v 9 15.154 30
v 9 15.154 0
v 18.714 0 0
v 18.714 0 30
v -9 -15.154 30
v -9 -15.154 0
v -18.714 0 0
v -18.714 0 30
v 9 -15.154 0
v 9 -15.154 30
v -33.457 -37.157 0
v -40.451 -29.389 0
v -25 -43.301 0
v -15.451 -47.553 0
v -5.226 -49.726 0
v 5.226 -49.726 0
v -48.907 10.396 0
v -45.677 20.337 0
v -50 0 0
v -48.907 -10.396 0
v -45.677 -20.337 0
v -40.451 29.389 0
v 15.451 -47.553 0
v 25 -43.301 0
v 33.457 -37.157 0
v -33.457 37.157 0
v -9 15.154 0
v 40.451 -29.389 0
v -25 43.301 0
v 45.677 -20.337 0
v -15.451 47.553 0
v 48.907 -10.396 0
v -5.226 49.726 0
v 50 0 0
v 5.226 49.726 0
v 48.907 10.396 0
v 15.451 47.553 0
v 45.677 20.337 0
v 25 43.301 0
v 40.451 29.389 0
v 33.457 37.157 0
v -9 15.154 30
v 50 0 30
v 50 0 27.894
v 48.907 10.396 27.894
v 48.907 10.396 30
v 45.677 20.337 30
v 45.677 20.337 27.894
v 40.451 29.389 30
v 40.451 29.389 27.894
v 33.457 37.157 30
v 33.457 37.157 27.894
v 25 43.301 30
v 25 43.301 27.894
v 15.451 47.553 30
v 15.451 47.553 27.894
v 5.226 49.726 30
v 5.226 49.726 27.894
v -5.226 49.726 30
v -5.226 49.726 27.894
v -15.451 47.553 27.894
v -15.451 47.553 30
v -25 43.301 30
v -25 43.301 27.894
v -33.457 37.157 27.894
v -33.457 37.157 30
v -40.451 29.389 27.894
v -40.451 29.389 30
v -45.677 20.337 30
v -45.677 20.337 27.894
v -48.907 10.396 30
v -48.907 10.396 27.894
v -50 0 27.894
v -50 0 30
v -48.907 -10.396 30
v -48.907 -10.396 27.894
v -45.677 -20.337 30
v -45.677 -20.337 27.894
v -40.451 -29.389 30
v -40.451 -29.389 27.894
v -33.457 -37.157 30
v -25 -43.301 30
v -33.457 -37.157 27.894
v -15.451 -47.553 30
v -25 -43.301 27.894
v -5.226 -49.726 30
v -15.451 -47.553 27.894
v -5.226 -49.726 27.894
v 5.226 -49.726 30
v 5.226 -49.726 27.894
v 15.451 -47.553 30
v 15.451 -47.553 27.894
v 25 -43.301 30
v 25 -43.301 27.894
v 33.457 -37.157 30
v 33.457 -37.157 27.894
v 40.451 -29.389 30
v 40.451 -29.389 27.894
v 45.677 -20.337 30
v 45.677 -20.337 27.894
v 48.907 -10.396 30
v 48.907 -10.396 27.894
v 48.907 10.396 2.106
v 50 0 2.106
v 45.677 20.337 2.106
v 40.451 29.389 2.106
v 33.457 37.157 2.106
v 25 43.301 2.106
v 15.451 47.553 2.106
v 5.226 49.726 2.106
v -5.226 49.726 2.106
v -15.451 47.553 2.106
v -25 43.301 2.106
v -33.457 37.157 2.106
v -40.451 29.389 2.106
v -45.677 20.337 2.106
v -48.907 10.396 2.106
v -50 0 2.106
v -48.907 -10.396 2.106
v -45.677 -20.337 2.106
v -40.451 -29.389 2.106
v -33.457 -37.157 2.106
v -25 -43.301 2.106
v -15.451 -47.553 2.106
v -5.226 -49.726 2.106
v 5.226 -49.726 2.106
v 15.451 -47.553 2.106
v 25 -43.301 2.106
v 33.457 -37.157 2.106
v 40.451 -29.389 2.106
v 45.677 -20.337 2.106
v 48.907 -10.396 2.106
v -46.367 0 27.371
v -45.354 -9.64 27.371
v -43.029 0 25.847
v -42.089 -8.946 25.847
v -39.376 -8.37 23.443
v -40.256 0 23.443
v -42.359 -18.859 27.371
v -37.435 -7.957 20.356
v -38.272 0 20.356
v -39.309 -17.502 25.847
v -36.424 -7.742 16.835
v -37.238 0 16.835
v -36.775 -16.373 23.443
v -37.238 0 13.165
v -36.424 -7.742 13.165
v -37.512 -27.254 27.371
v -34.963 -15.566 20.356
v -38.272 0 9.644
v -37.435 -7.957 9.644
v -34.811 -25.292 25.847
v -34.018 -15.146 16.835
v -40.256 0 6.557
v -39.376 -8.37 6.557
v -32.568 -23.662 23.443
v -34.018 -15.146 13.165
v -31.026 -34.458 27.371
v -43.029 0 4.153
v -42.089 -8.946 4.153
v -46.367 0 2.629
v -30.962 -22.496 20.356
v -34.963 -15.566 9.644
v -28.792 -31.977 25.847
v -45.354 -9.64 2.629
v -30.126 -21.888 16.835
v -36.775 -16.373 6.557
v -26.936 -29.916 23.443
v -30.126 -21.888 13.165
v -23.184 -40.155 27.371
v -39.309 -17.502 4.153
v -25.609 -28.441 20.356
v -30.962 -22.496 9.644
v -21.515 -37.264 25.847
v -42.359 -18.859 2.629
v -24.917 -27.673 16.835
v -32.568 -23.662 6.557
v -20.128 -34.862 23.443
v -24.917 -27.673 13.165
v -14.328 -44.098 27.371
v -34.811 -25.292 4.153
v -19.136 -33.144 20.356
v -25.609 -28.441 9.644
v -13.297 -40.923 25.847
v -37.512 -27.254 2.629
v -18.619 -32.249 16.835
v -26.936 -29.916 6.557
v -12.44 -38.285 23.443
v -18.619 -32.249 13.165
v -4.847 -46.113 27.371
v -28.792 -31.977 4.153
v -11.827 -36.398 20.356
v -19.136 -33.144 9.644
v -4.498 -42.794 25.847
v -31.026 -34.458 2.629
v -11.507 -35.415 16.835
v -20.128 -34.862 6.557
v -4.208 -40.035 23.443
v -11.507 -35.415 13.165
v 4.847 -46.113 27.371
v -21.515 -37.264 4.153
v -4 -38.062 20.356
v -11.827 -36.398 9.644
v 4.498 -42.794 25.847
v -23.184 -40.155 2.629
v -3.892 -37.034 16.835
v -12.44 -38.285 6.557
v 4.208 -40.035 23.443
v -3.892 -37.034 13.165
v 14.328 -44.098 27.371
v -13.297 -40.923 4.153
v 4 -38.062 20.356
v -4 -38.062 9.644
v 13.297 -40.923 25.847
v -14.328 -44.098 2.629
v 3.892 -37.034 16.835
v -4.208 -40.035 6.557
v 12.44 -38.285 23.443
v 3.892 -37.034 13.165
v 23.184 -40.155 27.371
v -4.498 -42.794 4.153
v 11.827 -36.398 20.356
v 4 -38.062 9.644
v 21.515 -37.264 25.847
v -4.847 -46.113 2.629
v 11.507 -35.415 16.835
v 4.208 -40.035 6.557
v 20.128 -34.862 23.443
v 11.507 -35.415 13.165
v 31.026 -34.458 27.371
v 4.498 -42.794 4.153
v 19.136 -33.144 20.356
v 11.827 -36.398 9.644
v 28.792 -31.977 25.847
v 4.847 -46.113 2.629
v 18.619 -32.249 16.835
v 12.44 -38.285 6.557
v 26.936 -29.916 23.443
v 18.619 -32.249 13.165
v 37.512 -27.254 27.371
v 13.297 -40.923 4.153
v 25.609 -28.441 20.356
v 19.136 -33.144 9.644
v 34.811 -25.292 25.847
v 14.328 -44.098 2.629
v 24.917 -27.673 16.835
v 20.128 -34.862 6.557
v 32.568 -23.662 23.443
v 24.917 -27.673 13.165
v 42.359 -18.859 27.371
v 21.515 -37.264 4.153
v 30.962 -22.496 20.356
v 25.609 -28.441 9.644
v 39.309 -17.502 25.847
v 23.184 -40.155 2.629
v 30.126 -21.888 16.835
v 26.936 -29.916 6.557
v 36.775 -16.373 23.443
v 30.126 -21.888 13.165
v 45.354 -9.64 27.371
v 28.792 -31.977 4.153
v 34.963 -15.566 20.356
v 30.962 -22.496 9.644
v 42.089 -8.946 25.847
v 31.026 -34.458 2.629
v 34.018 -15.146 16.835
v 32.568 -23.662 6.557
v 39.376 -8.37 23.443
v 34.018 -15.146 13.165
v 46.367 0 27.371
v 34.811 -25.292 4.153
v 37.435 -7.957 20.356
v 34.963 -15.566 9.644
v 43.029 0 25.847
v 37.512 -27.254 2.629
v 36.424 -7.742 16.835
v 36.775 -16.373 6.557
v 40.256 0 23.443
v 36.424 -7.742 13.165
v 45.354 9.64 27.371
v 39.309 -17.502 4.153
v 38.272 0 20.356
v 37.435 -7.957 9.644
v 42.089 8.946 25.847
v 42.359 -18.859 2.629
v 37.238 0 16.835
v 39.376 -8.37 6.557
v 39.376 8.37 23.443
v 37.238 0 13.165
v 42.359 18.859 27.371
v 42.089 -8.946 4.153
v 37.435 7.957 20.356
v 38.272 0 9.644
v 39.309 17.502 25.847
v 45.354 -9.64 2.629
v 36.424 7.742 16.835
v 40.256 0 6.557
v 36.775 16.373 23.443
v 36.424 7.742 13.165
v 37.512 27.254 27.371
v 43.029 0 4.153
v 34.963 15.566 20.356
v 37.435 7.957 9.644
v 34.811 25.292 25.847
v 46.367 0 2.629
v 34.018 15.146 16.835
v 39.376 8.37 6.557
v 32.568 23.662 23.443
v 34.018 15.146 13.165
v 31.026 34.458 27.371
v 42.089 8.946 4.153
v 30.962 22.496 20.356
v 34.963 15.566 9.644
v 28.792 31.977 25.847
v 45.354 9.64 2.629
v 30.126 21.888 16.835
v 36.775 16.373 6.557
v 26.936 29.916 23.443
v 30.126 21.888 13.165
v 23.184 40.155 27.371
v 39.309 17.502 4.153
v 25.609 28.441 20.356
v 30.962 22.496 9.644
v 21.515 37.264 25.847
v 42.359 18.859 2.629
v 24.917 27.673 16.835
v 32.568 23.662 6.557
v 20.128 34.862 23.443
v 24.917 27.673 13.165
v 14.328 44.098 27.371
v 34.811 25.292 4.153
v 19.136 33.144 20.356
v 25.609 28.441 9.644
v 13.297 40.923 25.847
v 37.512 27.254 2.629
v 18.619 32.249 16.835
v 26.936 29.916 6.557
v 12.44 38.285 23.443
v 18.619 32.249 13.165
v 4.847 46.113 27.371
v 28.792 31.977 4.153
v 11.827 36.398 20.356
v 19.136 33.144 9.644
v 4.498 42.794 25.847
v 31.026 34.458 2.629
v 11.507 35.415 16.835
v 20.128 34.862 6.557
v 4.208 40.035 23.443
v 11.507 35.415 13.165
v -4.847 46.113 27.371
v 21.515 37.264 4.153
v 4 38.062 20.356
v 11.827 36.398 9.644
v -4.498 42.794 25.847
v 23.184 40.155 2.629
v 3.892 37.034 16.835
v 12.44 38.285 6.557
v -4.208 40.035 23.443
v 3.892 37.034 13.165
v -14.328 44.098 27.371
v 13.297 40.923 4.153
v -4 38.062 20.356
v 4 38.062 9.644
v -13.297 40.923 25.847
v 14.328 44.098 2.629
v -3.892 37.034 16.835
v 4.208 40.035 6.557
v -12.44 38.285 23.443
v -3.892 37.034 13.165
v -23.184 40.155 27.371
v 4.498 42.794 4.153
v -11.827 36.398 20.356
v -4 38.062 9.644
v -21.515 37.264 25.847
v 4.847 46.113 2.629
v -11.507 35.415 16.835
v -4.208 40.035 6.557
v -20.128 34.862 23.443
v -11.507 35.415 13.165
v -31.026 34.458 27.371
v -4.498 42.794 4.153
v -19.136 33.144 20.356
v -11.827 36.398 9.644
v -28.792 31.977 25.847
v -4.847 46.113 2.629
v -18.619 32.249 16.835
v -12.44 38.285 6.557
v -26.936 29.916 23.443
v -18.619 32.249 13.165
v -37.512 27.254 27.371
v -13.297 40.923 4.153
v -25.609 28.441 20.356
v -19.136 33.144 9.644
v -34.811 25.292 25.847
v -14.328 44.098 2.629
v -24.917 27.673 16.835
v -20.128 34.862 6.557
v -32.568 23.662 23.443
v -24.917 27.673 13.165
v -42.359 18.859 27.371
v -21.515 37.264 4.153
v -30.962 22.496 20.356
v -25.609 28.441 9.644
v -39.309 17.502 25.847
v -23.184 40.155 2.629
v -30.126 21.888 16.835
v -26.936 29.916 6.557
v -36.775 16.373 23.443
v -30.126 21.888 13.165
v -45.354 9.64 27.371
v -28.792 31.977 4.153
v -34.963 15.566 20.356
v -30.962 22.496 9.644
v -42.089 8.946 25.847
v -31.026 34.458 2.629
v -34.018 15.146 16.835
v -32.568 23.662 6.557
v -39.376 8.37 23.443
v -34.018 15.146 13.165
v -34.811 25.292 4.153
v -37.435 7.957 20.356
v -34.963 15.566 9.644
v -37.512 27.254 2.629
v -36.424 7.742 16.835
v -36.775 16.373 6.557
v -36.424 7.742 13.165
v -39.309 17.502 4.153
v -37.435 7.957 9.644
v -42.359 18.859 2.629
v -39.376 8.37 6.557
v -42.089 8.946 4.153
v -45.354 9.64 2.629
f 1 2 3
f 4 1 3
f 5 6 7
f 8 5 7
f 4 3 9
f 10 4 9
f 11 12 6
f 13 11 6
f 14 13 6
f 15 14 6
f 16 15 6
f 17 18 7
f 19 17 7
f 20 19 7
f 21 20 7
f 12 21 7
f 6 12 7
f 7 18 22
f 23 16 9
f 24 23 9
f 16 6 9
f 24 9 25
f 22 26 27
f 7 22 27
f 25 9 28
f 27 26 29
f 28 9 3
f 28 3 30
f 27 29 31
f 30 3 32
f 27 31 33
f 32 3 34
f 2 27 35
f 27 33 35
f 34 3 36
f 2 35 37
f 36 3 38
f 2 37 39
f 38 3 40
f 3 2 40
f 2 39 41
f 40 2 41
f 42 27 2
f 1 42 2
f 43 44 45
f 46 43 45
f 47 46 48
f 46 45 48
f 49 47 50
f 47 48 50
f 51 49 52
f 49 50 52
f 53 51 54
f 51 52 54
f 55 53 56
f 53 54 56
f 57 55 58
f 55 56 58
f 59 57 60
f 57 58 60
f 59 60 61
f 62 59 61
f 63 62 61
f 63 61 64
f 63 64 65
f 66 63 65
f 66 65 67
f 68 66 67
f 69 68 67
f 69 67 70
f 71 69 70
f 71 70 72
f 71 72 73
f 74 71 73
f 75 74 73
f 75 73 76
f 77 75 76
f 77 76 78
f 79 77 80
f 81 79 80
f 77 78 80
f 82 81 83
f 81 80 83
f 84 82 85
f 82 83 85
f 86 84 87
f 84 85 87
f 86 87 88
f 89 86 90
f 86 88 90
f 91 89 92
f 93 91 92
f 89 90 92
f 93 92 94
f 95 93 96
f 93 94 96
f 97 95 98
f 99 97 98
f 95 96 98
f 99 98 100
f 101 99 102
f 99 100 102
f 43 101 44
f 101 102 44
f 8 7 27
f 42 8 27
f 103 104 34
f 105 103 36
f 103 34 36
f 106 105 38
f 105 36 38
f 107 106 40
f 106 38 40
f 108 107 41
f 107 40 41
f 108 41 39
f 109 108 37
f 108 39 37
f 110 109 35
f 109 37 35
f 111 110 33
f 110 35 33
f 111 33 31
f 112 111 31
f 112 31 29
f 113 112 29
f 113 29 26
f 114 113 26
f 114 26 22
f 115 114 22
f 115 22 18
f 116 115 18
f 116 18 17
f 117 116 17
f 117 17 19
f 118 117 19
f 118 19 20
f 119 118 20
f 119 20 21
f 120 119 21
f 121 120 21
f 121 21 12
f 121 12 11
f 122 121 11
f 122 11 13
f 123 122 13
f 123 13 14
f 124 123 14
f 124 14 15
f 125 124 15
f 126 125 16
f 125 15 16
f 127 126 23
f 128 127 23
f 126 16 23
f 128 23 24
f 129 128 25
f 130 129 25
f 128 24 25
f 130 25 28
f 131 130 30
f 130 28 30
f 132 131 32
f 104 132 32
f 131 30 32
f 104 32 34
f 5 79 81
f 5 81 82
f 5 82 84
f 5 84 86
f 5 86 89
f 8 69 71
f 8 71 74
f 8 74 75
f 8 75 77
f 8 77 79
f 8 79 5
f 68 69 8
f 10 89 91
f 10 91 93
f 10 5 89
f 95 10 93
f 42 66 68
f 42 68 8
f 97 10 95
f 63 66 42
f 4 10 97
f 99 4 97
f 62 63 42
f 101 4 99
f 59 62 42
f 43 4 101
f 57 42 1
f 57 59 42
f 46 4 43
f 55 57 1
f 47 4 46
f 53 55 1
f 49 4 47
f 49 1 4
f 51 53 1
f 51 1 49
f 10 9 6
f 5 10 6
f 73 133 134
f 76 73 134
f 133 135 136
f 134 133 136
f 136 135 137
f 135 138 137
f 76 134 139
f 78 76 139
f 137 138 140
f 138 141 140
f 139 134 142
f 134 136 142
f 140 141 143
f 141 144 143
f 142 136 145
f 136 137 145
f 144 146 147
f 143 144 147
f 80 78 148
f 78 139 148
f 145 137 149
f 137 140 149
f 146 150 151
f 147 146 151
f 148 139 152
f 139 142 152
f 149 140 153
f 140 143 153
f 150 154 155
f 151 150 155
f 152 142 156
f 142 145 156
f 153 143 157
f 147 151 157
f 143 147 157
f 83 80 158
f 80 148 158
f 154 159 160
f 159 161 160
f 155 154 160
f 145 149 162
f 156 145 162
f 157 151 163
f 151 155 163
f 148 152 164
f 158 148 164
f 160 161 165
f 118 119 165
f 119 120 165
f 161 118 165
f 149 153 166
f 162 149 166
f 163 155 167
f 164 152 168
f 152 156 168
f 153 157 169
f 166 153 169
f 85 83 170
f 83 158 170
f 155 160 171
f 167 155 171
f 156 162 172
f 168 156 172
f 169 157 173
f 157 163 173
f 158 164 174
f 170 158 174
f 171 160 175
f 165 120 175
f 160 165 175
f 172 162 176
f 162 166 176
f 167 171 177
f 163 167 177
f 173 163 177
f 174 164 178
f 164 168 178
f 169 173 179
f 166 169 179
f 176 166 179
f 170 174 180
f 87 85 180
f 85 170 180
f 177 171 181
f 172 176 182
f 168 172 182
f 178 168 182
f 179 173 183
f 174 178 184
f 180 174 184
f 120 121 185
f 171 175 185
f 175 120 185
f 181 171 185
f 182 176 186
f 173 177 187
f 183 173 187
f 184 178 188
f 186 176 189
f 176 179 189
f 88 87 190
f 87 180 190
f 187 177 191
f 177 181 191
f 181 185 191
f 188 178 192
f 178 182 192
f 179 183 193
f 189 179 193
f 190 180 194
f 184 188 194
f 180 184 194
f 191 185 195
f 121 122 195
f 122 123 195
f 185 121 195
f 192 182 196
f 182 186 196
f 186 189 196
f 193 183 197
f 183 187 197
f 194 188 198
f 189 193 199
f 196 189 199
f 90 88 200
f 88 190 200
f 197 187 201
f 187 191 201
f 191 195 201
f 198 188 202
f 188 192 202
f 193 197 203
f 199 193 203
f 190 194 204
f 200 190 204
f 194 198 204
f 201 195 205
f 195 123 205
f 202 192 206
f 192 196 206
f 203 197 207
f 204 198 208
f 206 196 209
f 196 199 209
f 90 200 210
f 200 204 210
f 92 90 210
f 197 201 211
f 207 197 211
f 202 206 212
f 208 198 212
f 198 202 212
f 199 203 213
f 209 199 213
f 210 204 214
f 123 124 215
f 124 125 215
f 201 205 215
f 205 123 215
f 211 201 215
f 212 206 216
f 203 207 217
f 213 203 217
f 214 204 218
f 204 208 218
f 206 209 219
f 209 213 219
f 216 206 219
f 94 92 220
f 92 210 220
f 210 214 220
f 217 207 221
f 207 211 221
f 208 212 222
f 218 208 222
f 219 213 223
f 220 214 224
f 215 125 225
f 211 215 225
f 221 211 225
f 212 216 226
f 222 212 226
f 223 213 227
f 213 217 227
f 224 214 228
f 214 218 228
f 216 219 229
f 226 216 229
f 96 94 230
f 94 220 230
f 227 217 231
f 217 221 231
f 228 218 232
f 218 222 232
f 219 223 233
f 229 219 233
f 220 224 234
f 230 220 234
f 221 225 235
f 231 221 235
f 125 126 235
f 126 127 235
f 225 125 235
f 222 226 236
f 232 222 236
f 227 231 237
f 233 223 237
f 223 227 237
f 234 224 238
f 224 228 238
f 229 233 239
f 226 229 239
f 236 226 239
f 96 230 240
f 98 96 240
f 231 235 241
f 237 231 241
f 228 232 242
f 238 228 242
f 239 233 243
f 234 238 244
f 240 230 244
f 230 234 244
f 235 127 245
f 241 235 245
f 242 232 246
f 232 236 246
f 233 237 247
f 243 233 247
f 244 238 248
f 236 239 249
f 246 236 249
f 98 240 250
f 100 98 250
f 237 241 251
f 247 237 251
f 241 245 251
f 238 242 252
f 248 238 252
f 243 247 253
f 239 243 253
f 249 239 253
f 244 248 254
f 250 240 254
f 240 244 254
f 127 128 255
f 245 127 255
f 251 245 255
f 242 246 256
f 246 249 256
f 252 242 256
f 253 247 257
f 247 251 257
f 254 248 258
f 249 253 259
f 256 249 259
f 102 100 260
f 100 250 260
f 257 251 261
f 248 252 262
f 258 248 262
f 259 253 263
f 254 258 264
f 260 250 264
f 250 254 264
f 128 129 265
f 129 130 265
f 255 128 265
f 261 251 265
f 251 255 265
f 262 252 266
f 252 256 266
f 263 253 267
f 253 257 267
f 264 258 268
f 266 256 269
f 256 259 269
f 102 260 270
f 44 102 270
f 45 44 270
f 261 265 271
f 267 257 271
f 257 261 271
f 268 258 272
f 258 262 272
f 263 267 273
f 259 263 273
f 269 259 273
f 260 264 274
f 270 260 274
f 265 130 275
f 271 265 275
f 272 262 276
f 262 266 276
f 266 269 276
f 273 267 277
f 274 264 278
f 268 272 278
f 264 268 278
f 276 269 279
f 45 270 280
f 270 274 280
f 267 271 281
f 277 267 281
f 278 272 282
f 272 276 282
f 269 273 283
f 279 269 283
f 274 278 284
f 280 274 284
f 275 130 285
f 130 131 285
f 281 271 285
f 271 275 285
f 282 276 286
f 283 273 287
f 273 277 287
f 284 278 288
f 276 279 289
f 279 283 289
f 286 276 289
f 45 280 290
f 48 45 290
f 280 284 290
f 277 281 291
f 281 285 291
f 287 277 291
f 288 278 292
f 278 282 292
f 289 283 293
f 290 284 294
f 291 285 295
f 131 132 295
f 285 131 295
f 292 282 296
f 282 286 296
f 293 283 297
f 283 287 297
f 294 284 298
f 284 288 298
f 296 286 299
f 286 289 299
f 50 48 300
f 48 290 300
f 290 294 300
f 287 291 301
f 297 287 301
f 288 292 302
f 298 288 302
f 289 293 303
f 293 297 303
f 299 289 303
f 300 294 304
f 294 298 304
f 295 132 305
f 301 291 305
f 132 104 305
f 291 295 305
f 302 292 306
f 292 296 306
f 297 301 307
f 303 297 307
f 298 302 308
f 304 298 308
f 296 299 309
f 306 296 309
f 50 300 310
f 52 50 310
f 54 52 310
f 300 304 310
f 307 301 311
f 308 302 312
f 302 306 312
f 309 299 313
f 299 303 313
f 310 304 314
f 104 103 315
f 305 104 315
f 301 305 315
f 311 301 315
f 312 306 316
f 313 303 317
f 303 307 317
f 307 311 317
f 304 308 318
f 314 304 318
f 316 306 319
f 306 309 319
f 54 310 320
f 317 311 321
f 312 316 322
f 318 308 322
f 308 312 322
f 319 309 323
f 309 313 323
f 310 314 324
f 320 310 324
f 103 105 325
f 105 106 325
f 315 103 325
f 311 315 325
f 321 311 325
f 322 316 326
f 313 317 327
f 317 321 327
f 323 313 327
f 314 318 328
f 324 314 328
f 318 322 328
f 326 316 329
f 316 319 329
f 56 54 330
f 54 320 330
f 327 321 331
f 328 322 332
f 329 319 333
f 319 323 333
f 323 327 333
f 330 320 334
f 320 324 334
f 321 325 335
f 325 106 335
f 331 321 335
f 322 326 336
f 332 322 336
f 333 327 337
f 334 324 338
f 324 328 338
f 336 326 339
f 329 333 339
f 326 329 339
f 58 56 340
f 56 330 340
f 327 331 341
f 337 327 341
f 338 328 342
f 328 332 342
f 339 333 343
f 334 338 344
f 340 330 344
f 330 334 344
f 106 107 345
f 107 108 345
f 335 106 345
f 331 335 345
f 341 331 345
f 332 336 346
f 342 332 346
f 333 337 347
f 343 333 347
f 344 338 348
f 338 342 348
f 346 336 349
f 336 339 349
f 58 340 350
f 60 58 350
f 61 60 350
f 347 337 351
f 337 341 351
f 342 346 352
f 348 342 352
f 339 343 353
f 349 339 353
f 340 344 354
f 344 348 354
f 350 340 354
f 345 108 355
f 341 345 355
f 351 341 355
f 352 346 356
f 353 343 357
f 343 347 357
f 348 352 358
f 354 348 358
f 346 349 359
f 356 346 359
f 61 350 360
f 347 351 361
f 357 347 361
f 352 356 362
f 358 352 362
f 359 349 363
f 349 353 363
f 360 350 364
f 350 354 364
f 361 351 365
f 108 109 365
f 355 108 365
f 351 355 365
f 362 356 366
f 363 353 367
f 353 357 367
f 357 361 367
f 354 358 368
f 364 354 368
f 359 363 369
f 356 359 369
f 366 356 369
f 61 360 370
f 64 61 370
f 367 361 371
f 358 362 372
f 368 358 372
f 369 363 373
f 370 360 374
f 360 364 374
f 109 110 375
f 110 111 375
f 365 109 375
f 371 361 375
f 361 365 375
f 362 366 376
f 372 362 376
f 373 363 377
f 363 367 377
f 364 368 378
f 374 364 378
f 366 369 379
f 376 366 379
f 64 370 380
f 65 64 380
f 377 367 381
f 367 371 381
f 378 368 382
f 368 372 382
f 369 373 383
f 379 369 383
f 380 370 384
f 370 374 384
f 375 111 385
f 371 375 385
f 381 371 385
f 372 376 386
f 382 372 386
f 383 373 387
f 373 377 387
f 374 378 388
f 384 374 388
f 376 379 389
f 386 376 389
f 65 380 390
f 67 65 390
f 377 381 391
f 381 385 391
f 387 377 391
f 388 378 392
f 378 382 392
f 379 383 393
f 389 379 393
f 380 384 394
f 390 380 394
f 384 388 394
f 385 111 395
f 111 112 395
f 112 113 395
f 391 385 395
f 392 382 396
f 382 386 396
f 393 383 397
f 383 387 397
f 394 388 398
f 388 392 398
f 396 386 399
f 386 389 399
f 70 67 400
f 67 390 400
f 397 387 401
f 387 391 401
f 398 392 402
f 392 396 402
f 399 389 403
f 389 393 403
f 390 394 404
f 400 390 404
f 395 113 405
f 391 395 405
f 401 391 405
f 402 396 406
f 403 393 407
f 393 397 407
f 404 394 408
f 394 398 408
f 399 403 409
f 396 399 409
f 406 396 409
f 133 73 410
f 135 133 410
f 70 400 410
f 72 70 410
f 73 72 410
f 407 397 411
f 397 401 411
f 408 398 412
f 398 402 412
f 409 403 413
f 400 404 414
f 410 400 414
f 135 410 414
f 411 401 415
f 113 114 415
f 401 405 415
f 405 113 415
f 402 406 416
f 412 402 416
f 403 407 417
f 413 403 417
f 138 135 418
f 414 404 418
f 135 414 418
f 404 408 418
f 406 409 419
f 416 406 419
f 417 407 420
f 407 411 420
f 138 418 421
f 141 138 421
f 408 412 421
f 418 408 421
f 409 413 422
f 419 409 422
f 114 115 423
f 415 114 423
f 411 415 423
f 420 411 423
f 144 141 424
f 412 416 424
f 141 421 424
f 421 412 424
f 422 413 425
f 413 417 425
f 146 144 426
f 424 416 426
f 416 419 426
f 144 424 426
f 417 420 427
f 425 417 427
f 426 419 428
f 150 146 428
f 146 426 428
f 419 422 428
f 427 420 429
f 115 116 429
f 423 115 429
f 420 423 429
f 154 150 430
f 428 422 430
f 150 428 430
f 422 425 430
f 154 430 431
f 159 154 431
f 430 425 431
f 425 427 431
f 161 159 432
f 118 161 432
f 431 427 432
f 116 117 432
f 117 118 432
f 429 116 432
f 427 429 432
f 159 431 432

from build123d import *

# Parameters (mm, degrees)
SKETCH1_R           = 50
BOSS_EXTRUDE1_DEPTH = 30
SKETCH2_R           = 12.893523165


with BuildPart() as part:
    # Sketch1 → Boss-Extrude1 (new body)
    with BuildSketch(Plane.XY):
        Circle(SKETCH1_R)
        Polygon((-9, 15.15359655), (9, 15.15359655), (18.714345659, 0), (9, -15.15359655), (-9, -15.15359655), (-18.714345659, 0), align=None, mode=Mode.SUBTRACT)
    extrude(amount=BOSS_EXTRUDE1_DEPTH)

    # Sketch2 → Cut-Revolve1 (revolve, cut)
    with BuildSketch(Plane(origin=(0, 0, 0), x_dir=(0, 0, -1), z_dir=(1, 0, 0)), mode=Mode.PRIVATE) as cut_revolve1_sk:
        with Locations((-15, 50)):
            Circle(SKETCH2_R)
    revolve(cut_revolve1_sk.sketch.rotate(Axis((0, 0, -15.913585238), (0, 0, 1)), 90), axis=Axis((0, 0, -15.913585238), (0, 0, 1)), mode=Mode.SUBTRACT)


solid = part.part
